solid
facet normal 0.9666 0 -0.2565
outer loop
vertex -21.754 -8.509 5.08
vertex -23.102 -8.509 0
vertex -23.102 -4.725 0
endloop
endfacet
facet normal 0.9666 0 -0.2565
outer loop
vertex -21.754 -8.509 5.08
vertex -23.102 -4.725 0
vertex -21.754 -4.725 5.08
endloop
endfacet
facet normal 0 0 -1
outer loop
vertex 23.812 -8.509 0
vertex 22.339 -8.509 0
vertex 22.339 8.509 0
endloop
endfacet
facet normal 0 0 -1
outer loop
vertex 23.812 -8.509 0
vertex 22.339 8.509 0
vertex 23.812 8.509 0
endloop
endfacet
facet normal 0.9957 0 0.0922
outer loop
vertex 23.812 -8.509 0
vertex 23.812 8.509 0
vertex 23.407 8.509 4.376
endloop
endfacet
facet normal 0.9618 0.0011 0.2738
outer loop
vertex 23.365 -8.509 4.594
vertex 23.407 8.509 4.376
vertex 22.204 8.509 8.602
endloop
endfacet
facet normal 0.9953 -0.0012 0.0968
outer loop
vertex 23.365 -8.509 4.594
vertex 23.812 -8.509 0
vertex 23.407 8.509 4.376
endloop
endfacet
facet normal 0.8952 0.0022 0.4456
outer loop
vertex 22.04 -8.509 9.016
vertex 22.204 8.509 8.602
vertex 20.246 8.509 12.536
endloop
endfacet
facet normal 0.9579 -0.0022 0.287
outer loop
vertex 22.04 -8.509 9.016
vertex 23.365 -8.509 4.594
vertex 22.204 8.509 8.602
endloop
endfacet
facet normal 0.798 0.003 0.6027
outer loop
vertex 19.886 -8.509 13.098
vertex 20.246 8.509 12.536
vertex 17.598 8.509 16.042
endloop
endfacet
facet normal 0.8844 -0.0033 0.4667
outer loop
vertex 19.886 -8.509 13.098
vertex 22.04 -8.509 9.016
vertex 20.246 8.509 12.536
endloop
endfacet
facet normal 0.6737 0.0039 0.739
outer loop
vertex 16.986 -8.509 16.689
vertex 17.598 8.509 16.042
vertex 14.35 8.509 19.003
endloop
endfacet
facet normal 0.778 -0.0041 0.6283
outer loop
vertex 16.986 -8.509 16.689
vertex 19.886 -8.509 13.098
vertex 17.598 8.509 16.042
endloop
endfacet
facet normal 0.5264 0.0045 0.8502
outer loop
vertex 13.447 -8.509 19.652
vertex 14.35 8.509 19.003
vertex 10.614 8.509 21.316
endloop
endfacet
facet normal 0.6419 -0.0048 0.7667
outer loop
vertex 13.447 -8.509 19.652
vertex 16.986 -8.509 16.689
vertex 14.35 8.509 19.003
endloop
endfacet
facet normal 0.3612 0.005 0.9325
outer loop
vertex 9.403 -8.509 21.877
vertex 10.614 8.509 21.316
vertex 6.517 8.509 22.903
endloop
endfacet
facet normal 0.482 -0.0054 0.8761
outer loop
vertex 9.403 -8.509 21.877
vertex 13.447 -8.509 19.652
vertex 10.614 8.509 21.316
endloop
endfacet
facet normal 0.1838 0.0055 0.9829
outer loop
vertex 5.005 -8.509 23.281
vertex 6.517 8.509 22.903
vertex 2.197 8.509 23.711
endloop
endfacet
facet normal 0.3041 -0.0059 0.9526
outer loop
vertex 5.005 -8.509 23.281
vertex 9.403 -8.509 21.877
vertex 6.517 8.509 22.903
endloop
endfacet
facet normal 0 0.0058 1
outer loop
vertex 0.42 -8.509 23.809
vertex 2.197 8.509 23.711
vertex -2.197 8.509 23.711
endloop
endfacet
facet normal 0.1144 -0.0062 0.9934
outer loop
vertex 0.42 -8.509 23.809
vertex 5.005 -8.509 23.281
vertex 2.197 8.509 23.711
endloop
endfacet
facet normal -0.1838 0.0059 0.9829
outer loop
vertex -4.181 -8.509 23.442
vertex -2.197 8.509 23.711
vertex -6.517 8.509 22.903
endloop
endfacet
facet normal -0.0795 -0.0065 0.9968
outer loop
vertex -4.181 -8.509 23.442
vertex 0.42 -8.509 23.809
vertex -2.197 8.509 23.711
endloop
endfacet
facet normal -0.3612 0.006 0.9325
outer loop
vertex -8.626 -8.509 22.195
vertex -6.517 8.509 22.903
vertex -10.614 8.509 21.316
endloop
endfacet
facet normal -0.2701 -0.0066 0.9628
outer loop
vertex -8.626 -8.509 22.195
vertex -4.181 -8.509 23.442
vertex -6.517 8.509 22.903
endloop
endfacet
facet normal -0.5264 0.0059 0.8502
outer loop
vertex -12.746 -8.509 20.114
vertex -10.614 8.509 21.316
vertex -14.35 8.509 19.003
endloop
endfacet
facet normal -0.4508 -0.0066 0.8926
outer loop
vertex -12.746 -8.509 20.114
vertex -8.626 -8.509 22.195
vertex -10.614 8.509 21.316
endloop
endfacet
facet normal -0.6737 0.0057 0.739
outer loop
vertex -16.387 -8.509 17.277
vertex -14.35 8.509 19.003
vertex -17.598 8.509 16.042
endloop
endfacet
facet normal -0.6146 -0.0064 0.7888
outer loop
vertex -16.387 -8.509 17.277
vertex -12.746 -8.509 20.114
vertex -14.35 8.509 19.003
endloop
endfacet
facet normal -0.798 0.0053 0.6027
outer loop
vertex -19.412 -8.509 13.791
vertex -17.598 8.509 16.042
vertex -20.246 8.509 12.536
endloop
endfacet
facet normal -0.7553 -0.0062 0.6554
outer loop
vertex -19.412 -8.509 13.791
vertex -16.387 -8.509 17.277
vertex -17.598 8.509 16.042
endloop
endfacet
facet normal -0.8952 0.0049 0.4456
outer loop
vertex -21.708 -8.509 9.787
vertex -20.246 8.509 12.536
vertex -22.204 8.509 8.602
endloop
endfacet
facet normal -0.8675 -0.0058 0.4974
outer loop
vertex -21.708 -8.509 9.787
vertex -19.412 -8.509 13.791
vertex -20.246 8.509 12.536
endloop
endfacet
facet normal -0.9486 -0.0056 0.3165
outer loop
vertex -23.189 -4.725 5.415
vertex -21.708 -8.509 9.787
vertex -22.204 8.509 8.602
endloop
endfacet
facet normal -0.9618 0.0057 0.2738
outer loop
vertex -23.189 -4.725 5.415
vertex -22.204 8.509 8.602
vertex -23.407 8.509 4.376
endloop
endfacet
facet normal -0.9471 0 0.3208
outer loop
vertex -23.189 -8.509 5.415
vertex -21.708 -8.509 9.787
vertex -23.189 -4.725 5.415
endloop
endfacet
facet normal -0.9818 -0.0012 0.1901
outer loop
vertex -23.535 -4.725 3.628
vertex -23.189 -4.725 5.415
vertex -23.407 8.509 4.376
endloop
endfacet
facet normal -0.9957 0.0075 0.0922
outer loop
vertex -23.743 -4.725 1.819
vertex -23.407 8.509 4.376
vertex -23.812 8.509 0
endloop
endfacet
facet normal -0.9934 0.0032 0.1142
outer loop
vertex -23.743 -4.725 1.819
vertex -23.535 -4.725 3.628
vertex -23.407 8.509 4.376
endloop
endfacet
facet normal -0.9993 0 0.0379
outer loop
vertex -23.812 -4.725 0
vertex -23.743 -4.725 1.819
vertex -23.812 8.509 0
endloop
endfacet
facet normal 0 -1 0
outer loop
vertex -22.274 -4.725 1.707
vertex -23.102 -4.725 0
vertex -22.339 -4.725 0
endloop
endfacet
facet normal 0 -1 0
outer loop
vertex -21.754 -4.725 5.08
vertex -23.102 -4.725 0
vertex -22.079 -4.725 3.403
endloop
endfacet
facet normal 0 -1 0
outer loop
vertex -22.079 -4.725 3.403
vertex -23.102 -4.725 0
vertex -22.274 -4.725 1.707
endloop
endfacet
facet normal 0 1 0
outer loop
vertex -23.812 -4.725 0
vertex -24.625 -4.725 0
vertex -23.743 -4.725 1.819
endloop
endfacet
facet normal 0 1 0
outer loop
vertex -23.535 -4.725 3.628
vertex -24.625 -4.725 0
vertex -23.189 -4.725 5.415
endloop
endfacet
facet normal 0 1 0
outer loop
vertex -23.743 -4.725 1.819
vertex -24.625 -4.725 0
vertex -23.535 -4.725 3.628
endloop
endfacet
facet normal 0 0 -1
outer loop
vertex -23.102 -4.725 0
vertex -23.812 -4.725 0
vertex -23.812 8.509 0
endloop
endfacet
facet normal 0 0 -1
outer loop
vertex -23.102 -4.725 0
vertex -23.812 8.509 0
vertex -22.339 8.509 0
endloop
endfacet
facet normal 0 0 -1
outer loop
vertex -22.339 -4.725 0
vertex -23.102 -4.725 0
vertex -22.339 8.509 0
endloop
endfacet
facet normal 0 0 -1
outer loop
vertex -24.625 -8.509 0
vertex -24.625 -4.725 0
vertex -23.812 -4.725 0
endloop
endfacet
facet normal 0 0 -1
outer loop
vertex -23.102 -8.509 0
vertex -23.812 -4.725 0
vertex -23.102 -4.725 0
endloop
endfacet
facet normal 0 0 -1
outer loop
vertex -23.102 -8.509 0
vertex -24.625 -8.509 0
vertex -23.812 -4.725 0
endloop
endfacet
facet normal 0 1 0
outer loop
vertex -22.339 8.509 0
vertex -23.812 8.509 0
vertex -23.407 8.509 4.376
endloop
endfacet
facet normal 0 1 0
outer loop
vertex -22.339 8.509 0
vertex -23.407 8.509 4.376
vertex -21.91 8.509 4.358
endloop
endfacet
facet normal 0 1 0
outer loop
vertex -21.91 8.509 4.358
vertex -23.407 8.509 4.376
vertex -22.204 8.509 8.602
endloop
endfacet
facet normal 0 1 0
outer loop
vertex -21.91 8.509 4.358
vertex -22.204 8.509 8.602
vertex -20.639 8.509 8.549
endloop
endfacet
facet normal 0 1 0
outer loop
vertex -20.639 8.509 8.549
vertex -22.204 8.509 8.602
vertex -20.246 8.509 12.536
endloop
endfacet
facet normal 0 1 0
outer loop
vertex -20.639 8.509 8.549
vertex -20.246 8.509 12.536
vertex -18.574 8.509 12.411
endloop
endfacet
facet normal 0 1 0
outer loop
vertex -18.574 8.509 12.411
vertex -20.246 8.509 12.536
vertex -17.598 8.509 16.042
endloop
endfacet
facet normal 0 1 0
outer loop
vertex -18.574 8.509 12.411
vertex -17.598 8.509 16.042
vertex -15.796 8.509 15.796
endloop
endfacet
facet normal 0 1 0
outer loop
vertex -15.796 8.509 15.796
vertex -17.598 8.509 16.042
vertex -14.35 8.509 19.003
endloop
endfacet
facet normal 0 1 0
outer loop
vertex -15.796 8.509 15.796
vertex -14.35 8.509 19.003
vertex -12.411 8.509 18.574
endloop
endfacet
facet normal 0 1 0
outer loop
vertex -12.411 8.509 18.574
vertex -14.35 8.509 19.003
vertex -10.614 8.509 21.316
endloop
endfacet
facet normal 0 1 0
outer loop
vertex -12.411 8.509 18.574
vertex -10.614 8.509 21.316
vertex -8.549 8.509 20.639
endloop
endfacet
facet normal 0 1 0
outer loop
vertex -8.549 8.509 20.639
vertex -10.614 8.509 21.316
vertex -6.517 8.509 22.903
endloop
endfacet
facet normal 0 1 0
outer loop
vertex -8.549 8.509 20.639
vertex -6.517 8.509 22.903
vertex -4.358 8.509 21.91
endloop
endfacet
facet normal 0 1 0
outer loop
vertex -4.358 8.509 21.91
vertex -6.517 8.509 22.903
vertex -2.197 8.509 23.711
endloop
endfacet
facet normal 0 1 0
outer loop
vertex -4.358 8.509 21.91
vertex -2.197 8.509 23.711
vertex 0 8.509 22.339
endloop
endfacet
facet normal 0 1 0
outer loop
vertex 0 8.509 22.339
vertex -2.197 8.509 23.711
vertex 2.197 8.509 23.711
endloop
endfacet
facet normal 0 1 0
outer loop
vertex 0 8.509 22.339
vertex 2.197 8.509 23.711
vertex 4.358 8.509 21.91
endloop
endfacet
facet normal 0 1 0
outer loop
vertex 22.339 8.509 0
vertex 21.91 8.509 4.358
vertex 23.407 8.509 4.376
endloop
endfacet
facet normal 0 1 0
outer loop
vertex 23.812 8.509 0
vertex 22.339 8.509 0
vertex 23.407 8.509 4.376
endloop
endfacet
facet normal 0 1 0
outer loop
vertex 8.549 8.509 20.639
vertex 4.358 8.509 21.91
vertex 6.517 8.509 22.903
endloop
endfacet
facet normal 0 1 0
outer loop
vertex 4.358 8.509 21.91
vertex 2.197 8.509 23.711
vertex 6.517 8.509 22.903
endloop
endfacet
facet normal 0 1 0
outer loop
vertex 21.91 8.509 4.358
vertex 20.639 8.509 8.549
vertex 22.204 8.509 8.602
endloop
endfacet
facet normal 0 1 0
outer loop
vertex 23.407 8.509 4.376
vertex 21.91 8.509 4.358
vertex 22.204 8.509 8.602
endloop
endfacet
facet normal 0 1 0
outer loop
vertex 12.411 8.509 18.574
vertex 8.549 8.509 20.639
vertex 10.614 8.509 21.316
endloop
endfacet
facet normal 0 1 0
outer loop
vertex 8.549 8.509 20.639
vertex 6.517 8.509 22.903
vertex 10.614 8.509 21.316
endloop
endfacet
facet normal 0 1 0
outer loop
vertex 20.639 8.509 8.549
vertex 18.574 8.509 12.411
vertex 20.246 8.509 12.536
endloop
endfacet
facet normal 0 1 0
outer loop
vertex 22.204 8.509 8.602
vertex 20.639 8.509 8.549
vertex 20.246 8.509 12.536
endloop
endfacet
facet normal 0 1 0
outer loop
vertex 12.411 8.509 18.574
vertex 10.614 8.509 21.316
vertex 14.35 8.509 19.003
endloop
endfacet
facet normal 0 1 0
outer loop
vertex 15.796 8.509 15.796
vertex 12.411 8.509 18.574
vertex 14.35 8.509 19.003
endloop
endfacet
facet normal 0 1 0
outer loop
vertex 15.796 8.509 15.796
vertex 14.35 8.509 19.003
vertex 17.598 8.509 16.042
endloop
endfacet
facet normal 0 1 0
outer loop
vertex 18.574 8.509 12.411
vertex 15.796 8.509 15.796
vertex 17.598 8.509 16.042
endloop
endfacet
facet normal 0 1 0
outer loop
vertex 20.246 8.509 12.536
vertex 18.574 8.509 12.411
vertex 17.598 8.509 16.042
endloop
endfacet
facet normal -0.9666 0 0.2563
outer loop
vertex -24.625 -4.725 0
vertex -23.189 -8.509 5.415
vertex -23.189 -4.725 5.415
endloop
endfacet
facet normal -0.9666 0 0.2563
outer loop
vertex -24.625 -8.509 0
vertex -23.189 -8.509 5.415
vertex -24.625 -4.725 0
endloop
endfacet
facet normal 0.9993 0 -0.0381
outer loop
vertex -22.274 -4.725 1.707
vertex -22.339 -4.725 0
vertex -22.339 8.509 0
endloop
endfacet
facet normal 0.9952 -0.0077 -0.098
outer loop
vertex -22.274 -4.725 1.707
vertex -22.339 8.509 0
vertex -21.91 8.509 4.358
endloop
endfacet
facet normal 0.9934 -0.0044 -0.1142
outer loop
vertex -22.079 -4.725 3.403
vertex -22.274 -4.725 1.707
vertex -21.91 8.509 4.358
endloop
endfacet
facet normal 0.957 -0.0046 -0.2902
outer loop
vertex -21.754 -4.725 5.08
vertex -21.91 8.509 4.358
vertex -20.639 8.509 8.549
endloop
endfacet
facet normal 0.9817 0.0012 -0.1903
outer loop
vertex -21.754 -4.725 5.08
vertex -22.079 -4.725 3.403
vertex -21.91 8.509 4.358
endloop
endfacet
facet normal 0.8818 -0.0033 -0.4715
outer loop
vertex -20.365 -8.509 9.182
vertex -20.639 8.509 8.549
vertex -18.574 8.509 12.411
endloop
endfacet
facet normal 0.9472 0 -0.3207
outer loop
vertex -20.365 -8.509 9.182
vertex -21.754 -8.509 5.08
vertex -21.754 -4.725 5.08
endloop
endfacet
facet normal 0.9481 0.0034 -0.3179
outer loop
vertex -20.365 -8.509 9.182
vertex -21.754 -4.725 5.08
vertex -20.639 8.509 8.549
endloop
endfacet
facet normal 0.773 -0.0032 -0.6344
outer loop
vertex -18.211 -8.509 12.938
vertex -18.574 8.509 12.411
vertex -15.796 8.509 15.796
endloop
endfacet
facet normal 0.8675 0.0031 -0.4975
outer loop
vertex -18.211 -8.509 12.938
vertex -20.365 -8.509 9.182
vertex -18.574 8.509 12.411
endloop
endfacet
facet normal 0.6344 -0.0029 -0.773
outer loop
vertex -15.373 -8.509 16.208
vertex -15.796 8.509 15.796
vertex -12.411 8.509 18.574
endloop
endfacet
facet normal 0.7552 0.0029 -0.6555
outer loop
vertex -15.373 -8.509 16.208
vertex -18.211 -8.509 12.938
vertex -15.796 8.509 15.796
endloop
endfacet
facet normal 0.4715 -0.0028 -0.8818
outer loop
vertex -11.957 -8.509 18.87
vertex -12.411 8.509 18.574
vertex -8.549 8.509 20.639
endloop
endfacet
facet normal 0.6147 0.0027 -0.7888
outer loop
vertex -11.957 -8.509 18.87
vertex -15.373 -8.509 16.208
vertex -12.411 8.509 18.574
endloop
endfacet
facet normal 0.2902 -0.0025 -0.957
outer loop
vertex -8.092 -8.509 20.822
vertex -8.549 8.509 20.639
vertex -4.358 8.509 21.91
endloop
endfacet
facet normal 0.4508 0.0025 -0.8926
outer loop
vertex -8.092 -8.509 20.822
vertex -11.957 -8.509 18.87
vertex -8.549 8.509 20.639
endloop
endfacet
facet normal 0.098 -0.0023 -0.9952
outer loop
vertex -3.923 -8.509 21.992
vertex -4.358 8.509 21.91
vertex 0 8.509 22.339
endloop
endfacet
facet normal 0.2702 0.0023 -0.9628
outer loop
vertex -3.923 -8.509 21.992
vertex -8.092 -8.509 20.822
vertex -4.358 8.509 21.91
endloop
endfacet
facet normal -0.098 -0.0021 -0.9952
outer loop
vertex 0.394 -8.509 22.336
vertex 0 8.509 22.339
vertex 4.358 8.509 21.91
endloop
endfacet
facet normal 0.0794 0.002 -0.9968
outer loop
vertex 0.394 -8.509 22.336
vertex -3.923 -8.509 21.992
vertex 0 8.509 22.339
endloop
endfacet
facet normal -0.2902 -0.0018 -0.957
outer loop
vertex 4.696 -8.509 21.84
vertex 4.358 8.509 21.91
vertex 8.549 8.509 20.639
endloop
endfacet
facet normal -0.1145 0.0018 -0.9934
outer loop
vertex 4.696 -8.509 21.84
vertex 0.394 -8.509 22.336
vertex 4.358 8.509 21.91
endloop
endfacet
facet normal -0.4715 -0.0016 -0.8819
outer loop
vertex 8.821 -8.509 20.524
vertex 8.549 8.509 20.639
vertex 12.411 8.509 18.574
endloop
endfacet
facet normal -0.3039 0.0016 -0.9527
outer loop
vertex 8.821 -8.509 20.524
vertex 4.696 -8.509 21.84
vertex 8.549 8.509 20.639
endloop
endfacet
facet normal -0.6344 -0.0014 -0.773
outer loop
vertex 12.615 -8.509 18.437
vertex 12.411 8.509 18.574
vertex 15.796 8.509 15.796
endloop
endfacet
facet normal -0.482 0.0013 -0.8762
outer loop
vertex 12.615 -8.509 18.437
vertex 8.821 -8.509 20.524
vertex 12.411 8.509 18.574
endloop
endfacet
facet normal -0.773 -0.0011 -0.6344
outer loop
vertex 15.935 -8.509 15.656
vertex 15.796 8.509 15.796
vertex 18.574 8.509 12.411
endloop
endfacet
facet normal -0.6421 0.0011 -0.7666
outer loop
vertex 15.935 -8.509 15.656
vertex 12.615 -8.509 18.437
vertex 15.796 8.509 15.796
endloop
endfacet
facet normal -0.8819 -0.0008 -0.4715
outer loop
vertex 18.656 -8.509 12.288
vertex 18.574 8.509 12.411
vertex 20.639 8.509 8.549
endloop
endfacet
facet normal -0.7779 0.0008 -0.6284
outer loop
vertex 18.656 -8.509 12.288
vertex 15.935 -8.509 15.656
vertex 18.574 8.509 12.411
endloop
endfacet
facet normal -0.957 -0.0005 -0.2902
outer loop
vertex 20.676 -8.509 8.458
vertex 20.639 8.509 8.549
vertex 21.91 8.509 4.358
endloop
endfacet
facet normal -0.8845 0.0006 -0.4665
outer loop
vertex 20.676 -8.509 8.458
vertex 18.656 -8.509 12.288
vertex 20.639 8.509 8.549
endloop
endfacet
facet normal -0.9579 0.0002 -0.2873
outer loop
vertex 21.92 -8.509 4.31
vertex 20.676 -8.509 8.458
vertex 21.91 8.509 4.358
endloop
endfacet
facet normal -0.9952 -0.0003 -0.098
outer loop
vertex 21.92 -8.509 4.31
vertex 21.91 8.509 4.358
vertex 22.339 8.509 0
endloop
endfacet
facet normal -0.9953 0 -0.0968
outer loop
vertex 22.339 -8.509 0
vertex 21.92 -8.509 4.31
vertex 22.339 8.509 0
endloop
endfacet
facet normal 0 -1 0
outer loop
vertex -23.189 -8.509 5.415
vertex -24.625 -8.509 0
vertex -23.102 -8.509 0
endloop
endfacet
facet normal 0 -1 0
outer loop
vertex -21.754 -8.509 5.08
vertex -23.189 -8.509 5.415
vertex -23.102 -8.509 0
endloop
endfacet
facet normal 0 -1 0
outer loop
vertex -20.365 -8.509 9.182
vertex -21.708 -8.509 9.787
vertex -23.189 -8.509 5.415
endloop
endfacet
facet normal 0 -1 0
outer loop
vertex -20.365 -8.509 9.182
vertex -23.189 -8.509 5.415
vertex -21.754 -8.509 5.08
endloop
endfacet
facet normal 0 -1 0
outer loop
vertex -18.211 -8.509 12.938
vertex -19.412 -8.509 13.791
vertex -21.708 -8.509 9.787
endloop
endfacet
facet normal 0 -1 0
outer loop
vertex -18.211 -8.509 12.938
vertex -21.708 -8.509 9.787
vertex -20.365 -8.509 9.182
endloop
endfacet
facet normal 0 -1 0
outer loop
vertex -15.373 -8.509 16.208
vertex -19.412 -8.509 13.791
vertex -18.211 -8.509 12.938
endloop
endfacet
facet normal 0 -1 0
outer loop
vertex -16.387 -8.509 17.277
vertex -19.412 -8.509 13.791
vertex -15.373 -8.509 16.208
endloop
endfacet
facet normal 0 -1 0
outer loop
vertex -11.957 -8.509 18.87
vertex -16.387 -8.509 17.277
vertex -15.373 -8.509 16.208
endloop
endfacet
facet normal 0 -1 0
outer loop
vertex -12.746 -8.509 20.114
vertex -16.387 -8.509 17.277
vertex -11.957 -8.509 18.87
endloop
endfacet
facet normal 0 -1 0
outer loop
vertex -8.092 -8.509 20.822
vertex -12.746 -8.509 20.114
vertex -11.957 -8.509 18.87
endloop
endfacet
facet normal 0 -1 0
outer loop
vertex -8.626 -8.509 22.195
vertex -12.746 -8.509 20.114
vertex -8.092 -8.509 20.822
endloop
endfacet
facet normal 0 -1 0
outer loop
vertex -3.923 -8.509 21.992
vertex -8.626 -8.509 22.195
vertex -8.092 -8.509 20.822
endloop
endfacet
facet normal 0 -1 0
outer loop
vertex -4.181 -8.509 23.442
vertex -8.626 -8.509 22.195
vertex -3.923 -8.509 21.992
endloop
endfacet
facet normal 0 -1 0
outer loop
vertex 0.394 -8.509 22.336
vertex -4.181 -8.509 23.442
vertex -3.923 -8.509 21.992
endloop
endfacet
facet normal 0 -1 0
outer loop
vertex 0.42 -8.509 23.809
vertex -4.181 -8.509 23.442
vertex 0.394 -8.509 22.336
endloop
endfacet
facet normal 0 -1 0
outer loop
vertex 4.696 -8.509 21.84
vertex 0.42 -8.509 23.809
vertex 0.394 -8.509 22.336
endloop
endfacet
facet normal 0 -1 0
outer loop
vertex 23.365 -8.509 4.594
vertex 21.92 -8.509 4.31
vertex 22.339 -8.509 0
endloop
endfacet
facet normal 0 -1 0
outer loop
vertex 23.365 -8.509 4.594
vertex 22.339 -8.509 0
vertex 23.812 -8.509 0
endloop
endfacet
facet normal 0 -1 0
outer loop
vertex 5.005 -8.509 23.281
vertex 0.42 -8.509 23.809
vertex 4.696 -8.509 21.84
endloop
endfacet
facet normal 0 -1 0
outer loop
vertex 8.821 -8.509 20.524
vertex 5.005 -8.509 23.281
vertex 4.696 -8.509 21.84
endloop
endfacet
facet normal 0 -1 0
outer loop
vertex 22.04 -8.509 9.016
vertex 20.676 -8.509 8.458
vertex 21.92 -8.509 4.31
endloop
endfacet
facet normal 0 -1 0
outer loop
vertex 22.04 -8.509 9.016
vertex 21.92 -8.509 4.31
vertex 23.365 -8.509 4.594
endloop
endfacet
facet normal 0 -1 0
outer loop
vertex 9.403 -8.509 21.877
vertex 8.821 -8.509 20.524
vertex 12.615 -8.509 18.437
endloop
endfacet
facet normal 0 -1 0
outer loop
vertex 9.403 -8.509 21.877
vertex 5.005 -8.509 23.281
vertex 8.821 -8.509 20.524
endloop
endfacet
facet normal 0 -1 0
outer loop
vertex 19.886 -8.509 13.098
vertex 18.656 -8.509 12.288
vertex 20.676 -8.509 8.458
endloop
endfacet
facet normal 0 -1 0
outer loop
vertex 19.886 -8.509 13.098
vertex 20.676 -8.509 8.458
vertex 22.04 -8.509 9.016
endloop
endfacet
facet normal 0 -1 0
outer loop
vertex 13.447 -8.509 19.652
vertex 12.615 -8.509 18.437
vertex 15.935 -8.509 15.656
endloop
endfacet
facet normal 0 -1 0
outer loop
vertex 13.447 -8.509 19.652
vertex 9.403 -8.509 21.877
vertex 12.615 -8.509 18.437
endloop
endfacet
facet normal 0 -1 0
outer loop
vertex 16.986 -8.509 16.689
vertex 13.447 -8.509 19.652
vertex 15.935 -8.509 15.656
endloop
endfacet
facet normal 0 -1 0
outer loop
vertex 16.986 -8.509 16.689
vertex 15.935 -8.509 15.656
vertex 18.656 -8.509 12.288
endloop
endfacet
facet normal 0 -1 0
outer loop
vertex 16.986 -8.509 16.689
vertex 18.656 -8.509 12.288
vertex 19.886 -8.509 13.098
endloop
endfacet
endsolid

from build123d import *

# Parameters (mm, degrees)
F1_DEPTH = 8.509
F3_DEPTH = 3.784
F5_DEPTH = 3.784


with BuildPart() as f1:
    # F0 (on Front) → F1 (new body, symmetric)
    with BuildSketch(Plane.XZ):
        with BuildLine():
            ThreePointArc((-22.3393, 0), (0, 22.3393), (22.3393, 0))
            Line((22.3393, 0), (23.8125, 0))
            ThreePointArc((23.8125, 0), (0, 23.8125), (-23.8125, 0))
            Line((-23.8125, 0), (-22.3393, 0))
        make_face()
    extrude(amount=F1_DEPTH, both=True)

    # F2 (on face) → F3 (cut)
    with BuildSketch(Plane.XZ.offset(8.509)):
        with BuildLine():
            Line((-24.2808054107, 0), (-22.3393, 0))
            ThreePointArc((-22.3393, 0), (-22.1925007591, 2.5568016248), (-21.7540323731, 5.08))
            Line((-21.7540323731, 5.08), (-23.6446719547, 5.5215033775))
            ThreePointArc((-23.6446719547, 5.5215033775), (-24.1212477924, 2.7790135535), (-24.2808054107, 0))
        make_face()
    extrude(amount=-F3_DEPTH, mode=Mode.SUBTRACT)

    # F4 (on face) → F5 (join, through all)
    with BuildSketch(Plane.XZ.offset(8.509)):
        Polygon((-21.7540323731, 5.08), (-23.1886357568, 5.4150095097), (-24.6253, 0), (-23.101814744, 0), align=None)
    extrude(amount=-F5_DEPTH)


solid = f1.part
